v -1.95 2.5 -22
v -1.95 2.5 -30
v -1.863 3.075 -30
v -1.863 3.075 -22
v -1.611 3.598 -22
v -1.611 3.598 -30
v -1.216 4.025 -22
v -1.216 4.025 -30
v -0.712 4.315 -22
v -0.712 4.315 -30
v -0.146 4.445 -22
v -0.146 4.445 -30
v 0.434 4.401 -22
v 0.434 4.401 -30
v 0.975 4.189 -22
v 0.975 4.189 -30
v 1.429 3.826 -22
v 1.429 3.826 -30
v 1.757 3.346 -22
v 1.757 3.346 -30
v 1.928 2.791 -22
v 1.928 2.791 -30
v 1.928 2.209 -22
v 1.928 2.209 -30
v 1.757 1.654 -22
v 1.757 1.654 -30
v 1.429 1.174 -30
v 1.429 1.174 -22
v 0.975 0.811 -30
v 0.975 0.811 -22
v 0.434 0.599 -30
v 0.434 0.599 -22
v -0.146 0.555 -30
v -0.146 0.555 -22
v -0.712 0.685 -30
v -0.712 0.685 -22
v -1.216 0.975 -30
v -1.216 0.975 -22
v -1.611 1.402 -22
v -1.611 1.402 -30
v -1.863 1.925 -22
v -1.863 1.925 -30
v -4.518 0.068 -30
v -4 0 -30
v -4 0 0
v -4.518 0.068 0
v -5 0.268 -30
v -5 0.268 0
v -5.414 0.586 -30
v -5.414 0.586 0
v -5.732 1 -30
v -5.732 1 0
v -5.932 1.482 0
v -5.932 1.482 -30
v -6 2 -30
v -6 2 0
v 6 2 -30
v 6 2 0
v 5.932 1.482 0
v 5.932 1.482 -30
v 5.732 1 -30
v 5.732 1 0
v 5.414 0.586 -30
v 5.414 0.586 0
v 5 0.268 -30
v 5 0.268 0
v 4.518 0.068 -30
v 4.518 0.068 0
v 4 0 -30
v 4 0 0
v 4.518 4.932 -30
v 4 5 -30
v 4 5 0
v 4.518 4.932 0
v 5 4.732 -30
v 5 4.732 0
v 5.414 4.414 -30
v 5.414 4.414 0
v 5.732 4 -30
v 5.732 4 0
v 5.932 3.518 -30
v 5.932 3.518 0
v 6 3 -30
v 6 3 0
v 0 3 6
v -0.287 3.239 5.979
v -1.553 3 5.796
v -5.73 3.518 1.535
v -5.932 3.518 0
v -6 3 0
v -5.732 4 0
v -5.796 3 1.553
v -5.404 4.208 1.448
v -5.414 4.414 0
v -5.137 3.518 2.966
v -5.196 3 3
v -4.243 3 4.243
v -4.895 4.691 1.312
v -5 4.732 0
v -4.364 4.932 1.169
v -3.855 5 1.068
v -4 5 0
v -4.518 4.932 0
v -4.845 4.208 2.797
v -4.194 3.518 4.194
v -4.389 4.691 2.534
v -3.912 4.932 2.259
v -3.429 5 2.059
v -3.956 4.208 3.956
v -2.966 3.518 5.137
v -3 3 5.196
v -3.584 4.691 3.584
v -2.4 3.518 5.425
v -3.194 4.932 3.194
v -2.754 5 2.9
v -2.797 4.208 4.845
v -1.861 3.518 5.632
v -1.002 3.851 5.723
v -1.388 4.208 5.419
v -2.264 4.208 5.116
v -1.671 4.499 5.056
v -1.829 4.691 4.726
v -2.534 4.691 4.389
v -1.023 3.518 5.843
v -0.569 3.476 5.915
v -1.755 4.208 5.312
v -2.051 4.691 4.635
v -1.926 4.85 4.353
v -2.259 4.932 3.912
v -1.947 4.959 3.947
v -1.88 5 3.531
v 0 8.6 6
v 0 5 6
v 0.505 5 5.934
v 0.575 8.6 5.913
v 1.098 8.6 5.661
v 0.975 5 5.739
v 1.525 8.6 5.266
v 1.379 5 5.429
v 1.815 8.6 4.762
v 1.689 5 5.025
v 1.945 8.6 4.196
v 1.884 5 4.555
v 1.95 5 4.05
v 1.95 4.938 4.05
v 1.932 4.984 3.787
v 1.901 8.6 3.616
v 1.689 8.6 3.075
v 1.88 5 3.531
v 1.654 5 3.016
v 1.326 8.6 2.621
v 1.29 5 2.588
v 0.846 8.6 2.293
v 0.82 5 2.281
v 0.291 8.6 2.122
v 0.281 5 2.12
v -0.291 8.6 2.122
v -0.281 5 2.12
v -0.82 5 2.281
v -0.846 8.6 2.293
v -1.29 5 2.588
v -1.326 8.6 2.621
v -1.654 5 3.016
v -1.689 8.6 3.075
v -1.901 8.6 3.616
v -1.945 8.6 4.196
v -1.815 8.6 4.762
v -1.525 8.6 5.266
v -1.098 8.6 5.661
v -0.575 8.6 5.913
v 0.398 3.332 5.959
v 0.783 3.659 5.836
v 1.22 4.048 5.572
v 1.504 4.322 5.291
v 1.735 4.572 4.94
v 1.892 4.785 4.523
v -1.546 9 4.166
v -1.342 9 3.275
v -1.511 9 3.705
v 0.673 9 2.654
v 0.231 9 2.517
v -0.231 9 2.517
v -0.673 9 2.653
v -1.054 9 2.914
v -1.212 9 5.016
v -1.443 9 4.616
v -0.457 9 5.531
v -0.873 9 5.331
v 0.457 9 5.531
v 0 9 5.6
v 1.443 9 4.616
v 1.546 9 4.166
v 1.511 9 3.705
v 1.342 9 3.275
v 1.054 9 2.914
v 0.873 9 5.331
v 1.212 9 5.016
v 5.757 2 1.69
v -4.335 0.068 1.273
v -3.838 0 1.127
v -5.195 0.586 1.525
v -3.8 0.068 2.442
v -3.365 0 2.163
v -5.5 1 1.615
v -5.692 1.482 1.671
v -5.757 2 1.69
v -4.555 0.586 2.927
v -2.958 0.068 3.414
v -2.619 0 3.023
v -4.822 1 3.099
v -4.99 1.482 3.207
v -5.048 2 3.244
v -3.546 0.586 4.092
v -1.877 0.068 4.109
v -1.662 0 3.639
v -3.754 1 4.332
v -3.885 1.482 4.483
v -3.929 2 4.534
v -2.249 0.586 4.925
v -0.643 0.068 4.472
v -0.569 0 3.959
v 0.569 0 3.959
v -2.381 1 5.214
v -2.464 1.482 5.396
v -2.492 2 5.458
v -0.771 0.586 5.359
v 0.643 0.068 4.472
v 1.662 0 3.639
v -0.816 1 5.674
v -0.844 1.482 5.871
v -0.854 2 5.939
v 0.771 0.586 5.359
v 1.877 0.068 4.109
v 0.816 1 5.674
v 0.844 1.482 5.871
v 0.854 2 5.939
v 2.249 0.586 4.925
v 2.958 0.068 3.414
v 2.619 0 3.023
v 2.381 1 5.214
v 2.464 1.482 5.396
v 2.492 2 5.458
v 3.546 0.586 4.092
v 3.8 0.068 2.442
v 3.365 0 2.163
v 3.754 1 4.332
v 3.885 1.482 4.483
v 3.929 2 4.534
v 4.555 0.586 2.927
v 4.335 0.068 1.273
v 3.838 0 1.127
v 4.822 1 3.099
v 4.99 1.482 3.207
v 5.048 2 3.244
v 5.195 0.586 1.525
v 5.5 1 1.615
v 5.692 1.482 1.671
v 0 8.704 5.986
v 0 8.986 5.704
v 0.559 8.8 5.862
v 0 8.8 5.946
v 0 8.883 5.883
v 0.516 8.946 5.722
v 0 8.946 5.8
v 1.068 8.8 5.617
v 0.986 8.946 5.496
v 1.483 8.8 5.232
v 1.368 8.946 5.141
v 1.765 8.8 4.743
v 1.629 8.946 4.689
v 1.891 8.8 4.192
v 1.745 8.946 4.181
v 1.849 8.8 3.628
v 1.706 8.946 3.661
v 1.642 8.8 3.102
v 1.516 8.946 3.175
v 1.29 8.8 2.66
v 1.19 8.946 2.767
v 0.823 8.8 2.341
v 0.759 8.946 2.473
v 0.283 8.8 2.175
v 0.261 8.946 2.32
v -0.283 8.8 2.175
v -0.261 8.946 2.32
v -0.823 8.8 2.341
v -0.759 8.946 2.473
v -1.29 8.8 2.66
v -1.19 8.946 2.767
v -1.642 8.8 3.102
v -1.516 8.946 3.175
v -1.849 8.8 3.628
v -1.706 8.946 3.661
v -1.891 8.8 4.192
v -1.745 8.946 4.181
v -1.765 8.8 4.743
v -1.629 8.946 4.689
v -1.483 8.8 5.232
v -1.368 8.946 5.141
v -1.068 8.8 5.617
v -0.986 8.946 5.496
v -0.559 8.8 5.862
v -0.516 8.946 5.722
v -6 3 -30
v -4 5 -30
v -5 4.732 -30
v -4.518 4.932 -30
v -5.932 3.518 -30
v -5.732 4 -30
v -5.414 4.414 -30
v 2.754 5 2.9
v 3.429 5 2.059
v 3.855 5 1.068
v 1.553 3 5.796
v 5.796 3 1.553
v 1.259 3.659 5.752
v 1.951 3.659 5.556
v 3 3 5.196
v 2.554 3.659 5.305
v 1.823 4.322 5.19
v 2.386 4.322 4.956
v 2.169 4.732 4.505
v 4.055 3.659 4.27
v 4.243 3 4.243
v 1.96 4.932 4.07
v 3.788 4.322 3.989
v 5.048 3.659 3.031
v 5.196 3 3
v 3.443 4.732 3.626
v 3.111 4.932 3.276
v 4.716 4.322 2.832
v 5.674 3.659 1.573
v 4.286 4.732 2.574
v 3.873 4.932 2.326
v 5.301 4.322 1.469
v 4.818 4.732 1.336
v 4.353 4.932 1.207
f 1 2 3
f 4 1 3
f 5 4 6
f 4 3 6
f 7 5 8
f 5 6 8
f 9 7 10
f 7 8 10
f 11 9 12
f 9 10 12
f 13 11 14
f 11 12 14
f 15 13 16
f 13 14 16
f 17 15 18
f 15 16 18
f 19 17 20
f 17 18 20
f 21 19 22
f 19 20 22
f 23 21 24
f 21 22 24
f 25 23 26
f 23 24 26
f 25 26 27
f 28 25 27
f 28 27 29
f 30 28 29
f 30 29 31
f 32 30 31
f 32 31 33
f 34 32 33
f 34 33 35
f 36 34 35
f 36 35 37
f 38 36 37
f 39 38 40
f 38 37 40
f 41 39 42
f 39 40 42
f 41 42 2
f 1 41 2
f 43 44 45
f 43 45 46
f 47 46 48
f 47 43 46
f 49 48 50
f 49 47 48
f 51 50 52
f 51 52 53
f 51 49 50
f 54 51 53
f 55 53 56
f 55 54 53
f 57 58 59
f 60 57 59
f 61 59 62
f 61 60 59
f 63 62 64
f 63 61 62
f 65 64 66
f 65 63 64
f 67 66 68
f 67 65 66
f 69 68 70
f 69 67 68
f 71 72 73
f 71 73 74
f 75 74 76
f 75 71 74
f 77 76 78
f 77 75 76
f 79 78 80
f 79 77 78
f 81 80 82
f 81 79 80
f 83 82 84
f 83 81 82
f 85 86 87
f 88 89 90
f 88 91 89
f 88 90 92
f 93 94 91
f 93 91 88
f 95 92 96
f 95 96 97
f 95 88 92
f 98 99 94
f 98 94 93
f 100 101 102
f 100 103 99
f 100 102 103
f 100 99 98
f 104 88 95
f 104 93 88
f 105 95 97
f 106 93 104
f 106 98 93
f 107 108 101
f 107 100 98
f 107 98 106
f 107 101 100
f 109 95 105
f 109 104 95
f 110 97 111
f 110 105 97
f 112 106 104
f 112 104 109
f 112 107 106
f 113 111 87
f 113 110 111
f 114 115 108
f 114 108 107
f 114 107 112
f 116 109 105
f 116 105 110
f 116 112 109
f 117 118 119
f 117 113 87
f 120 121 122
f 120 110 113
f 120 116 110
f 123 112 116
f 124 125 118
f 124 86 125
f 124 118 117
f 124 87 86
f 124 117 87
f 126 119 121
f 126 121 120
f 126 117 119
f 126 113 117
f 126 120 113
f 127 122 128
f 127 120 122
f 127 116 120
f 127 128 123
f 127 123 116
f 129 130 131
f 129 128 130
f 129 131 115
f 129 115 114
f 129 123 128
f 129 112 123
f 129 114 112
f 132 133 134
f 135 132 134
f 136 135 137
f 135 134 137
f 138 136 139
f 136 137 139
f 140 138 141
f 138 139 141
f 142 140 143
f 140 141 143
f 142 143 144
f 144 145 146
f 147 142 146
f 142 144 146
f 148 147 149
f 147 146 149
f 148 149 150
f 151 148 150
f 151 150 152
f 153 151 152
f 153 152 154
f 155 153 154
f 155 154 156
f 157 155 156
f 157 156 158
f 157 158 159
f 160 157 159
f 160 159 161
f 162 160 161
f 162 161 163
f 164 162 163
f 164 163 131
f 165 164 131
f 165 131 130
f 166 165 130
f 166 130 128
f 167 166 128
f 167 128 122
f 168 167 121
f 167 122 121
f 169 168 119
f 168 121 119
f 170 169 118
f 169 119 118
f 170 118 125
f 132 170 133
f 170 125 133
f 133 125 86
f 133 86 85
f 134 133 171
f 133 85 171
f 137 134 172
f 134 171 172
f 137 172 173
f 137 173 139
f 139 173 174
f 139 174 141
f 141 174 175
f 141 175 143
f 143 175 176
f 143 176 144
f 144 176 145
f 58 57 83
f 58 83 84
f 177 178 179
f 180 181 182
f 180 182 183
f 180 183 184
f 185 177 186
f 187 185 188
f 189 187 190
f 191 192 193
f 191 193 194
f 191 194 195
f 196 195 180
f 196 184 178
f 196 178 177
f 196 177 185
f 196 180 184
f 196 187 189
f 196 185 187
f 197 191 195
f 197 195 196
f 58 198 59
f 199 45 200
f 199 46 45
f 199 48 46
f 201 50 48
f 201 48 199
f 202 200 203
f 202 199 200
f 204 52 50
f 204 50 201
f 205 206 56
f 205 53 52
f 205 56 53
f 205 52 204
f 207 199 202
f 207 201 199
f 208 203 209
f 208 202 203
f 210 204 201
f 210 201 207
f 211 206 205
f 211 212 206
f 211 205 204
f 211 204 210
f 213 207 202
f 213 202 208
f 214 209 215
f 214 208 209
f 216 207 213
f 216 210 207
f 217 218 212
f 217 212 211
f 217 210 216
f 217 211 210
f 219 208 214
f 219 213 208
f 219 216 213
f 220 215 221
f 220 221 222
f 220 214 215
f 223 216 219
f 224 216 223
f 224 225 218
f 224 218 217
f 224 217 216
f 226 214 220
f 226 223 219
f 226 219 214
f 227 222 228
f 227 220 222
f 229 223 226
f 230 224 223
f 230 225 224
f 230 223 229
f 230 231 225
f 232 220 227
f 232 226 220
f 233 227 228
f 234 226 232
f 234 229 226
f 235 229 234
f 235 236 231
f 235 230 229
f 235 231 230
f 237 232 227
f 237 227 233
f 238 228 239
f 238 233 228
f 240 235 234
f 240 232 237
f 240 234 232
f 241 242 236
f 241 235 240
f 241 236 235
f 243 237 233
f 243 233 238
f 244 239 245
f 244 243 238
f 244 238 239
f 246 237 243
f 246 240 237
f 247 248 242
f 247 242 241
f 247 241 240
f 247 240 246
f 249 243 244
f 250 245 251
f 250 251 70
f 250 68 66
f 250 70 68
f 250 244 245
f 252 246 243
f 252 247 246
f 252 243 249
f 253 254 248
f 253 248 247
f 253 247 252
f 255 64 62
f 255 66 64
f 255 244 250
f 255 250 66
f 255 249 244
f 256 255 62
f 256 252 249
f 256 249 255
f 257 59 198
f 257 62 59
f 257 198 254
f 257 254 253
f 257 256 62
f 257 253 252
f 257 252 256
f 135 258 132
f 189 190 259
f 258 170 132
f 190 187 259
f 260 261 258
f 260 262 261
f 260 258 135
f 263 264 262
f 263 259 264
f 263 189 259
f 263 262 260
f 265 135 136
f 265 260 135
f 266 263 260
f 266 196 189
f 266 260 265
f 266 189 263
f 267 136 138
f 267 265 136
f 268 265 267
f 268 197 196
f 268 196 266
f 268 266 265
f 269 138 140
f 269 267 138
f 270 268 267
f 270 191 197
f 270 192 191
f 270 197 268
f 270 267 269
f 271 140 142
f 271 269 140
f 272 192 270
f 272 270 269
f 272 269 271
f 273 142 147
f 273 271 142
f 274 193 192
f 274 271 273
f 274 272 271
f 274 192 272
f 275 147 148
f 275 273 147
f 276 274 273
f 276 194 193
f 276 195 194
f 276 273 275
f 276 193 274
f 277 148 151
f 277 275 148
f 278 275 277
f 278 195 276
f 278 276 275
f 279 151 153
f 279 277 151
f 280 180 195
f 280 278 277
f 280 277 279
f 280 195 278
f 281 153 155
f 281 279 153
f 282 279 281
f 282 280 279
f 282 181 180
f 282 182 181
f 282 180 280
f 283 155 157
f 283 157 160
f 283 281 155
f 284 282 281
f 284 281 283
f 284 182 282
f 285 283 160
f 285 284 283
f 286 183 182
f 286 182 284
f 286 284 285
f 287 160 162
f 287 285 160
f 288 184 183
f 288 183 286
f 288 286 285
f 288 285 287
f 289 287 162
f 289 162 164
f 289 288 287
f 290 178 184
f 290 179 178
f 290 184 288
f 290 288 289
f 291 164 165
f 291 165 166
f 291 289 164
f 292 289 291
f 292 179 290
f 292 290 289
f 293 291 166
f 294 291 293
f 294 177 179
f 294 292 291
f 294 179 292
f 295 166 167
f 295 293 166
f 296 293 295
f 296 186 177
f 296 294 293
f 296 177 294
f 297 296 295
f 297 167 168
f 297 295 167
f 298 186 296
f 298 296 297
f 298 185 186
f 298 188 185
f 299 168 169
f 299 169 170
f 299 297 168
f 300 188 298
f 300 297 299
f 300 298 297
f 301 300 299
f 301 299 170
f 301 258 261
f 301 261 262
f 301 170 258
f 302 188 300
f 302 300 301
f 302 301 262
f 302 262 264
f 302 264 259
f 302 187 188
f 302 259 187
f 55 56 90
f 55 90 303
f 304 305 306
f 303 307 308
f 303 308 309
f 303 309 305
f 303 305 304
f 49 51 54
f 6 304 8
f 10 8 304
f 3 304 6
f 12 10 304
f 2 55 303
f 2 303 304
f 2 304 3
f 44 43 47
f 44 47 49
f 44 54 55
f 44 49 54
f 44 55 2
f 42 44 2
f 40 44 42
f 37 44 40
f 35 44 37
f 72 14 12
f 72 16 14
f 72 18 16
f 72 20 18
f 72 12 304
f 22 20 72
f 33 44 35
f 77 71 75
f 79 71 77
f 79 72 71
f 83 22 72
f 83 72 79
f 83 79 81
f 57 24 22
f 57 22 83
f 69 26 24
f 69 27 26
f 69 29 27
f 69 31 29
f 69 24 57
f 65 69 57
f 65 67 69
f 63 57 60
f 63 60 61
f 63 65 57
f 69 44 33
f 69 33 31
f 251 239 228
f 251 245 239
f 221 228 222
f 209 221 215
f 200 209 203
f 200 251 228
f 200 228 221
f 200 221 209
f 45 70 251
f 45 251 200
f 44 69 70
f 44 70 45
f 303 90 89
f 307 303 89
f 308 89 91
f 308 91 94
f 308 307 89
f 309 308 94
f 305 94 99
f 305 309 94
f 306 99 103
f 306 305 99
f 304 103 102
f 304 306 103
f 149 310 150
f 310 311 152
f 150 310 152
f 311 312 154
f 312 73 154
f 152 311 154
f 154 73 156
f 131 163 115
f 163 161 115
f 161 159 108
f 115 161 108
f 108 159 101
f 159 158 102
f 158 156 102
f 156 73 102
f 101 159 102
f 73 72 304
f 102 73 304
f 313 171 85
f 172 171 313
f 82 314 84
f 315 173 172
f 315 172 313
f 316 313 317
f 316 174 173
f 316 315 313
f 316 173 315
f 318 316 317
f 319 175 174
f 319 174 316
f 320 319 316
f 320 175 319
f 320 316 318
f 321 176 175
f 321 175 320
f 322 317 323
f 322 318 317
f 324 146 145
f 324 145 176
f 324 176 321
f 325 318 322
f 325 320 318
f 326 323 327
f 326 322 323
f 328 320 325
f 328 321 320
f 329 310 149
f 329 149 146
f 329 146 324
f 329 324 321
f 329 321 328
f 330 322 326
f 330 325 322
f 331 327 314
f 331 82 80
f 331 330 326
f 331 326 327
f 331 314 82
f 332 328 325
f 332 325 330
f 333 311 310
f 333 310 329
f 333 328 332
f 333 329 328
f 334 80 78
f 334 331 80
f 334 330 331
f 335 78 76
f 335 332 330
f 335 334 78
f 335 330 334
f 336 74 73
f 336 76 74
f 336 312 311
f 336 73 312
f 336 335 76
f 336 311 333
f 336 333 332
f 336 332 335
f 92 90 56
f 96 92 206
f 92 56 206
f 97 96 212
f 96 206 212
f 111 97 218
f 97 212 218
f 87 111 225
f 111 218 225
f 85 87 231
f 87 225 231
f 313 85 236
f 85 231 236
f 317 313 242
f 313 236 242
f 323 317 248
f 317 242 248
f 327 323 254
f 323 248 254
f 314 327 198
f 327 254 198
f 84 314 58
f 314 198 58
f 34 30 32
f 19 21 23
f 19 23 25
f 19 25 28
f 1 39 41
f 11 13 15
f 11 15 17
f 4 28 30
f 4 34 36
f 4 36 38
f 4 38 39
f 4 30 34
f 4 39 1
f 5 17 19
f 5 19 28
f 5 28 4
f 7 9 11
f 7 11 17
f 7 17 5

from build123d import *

# Parameters (mm, degrees)
BOSS_EXTRUDE1_DEPTH = 5
SKETCH2_R           = 1.95
CUT_EXTRUDE1_DEPTH  = 8
SKETCH3_R           = 1.95
BOSS_EXTRUDE2_DEPTH = 4
FILLET2_START       = -1e-07
FILLET2_OUTLINE_W   = 12
FILLET2_OUTLINE_H   = 5
FILLET2_DEPTH       = 6.0000001
FILLET2_START_2     = -31
FILLET2_2_DEPTH     = 32.804913921
FILLET2_START_3     = 2
FILLET2_3_DEPTH     = 0.9999999
FILLET2_4_OUTLINE_R = 1.95
FILLET2_4_DEPTH     = 3
FILLET3_R           = 0.4


with BuildPart() as part:
    # Sketch1 → Boss-Extrude1 (new body)
    with BuildSketch(Plane(origin=(0, 0, 0), x_dir=(1, 0, 0), z_dir=(0, 1, 0))):
        with BuildLine():
            Line((-6, 0), (-6, 30))
            Line((-6, 30), (6, 30))
            Line((6, 30), (6, 0))
            ThreePointArc((6, 0), (0, -6), (-6, 0))
        make_face()
    extrude(amount=BOSS_EXTRUDE1_DEPTH)

    # Sketch2 → Cut-Extrude1 (cut)
    with BuildSketch(Plane(origin=(0, 0, -30), x_dir=(-1, 0, 0), z_dir=(0, 0, -1))):
        with Locations((0, 2.5)):
            Circle(SKETCH2_R)
    extrude(amount=-CUT_EXTRUDE1_DEPTH, mode=Mode.SUBTRACT)

    # Sketch3 → Boss-Extrude2 (add)
    with BuildSketch(Plane(origin=(0, 5, 0), x_dir=(1, 0, 0), z_dir=(0, 1, 0))):
        with Locations(Location((0, -4.05, 0), (0, 0, 269.999293734))):
            Circle(SKETCH3_R)
    extrude(amount=BOSS_EXTRUDE2_DEPTH)

    # Fillet2: read off the stored shape, not the designer's step
    # Fillet2 outline → Fillet2 (cut)
    with BuildSketch(Plane.XY.offset(FILLET2_START)):
        with Locations((0, 2.5)):
            Rectangle(FILLET2_OUTLINE_W, FILLET2_OUTLINE_H)
    extrude(amount=FILLET2_DEPTH, mode=Mode.SUBTRACT)

    # Fillet2 2 outline → Fillet2 2 (cut)
    with BuildSketch(Plane.XY.offset(FILLET2_START_2)):
        with BuildLine():
            ThreePointArc((-4, 0), (-5.414213562, 0.585786438), (-6, 2))
            Line((-6, 2), (-6, 0))
            Line((-6, 0), (-4, 0))
        make_face()
        with BuildLine():
            Line((-6, 5), (-6, 3))
            ThreePointArc((-6, 3), (-5.414213562, 4.414213562), (-4, 5))
            Line((-4, 5), (-6, 5))
        make_face()
        with BuildLine():
            ThreePointArc((6, 2), (5.414213562, 0.585786438), (4, 0))
            Line((4, 0), (6, 0))
            Line((6, 0), (6, 2))
        make_face()
        with BuildLine():
            Line((6, 5), (4, 5))
            ThreePointArc((4, 5), (5.414213562, 4.414213562), (6, 3))
            Line((6, 3), (6, 5))
        make_face()
    extrude(amount=FILLET2_2_DEPTH, mode=Mode.SUBTRACT)

    # Fillet2 3 outline → Fillet2 3 (add)
    with BuildSketch(Plane(origin=(0, 0, 0), x_dir=(1, 0, 0), z_dir=(0, 1, 0)).offset(FILLET2_START_3)):
        with BuildLine():
            Line((6, 5e-08), (-6, 5e-08))
            ThreePointArc((-6, 5e-08), (0, -6), (6, 5e-08))
        make_face()
    extrude(amount=FILLET2_3_DEPTH)

    # Fillet2 4 outline → Fillet2 4 (add)
    with BuildSketch(Plane(origin=(0, 0, 0), x_dir=(1, 0, 0), z_dir=(0, 1, 0)).offset(FILLET2_START_3)):
        with Locations((0, -4.05)):
            Circle(FILLET2_4_OUTLINE_R)
    extrude(amount=FILLET2_4_DEPTH)

    # Fillet2 5 outline → Fillet2 5 (revolve)
    with BuildSketch(Plane.XY):
        with BuildLine():
            Line((4, 5), (0, 5))
            Line((0, 5), (0, 2.9999999))
            Line((0, 2.9999999), (6, 3))
            ThreePointArc((6, 3), (5.414213562, 4.414213562), (4, 5))
        make_face()
        with BuildLine():
            Line((0, 2), (0, 0))
            Line((0, 0), (4, 0))
            ThreePointArc((4, 0), (5.414213562, 0.585786438), (6, 2))
            Line((6, 2), (0, 2))
        make_face()
    revolve(axis=Axis((0, 0, 0), (0, 1, 0)))

    # Fillet3
    # the kernel refuses this fillet: 0.4 mm, written as the material it takes off along each edge
    with BuildSketch(Plane(origin=(0, 9, 4.05), x_dir=(-1.2326667094924345e-05, 0, 0.9999999999240267), z_dir=(-0.9999999999240267, 0, -1.2326667094924345e-05))) as fillet3_piece_1:
        with BuildLine():
            CenterArc((1.95 - FILLET3_R, -FILLET3_R), FILLET3_R, 0, 90)
            Line((1.95 - FILLET3_R, 0), (1.95, 0))
            Line((1.95, 0), (1.95, -FILLET3_R))
        make_face()
    revolve(axis=Axis((0, 9, 4.05), (0, 1, 0)), mode=Mode.SUBTRACT)


solid = part.part
